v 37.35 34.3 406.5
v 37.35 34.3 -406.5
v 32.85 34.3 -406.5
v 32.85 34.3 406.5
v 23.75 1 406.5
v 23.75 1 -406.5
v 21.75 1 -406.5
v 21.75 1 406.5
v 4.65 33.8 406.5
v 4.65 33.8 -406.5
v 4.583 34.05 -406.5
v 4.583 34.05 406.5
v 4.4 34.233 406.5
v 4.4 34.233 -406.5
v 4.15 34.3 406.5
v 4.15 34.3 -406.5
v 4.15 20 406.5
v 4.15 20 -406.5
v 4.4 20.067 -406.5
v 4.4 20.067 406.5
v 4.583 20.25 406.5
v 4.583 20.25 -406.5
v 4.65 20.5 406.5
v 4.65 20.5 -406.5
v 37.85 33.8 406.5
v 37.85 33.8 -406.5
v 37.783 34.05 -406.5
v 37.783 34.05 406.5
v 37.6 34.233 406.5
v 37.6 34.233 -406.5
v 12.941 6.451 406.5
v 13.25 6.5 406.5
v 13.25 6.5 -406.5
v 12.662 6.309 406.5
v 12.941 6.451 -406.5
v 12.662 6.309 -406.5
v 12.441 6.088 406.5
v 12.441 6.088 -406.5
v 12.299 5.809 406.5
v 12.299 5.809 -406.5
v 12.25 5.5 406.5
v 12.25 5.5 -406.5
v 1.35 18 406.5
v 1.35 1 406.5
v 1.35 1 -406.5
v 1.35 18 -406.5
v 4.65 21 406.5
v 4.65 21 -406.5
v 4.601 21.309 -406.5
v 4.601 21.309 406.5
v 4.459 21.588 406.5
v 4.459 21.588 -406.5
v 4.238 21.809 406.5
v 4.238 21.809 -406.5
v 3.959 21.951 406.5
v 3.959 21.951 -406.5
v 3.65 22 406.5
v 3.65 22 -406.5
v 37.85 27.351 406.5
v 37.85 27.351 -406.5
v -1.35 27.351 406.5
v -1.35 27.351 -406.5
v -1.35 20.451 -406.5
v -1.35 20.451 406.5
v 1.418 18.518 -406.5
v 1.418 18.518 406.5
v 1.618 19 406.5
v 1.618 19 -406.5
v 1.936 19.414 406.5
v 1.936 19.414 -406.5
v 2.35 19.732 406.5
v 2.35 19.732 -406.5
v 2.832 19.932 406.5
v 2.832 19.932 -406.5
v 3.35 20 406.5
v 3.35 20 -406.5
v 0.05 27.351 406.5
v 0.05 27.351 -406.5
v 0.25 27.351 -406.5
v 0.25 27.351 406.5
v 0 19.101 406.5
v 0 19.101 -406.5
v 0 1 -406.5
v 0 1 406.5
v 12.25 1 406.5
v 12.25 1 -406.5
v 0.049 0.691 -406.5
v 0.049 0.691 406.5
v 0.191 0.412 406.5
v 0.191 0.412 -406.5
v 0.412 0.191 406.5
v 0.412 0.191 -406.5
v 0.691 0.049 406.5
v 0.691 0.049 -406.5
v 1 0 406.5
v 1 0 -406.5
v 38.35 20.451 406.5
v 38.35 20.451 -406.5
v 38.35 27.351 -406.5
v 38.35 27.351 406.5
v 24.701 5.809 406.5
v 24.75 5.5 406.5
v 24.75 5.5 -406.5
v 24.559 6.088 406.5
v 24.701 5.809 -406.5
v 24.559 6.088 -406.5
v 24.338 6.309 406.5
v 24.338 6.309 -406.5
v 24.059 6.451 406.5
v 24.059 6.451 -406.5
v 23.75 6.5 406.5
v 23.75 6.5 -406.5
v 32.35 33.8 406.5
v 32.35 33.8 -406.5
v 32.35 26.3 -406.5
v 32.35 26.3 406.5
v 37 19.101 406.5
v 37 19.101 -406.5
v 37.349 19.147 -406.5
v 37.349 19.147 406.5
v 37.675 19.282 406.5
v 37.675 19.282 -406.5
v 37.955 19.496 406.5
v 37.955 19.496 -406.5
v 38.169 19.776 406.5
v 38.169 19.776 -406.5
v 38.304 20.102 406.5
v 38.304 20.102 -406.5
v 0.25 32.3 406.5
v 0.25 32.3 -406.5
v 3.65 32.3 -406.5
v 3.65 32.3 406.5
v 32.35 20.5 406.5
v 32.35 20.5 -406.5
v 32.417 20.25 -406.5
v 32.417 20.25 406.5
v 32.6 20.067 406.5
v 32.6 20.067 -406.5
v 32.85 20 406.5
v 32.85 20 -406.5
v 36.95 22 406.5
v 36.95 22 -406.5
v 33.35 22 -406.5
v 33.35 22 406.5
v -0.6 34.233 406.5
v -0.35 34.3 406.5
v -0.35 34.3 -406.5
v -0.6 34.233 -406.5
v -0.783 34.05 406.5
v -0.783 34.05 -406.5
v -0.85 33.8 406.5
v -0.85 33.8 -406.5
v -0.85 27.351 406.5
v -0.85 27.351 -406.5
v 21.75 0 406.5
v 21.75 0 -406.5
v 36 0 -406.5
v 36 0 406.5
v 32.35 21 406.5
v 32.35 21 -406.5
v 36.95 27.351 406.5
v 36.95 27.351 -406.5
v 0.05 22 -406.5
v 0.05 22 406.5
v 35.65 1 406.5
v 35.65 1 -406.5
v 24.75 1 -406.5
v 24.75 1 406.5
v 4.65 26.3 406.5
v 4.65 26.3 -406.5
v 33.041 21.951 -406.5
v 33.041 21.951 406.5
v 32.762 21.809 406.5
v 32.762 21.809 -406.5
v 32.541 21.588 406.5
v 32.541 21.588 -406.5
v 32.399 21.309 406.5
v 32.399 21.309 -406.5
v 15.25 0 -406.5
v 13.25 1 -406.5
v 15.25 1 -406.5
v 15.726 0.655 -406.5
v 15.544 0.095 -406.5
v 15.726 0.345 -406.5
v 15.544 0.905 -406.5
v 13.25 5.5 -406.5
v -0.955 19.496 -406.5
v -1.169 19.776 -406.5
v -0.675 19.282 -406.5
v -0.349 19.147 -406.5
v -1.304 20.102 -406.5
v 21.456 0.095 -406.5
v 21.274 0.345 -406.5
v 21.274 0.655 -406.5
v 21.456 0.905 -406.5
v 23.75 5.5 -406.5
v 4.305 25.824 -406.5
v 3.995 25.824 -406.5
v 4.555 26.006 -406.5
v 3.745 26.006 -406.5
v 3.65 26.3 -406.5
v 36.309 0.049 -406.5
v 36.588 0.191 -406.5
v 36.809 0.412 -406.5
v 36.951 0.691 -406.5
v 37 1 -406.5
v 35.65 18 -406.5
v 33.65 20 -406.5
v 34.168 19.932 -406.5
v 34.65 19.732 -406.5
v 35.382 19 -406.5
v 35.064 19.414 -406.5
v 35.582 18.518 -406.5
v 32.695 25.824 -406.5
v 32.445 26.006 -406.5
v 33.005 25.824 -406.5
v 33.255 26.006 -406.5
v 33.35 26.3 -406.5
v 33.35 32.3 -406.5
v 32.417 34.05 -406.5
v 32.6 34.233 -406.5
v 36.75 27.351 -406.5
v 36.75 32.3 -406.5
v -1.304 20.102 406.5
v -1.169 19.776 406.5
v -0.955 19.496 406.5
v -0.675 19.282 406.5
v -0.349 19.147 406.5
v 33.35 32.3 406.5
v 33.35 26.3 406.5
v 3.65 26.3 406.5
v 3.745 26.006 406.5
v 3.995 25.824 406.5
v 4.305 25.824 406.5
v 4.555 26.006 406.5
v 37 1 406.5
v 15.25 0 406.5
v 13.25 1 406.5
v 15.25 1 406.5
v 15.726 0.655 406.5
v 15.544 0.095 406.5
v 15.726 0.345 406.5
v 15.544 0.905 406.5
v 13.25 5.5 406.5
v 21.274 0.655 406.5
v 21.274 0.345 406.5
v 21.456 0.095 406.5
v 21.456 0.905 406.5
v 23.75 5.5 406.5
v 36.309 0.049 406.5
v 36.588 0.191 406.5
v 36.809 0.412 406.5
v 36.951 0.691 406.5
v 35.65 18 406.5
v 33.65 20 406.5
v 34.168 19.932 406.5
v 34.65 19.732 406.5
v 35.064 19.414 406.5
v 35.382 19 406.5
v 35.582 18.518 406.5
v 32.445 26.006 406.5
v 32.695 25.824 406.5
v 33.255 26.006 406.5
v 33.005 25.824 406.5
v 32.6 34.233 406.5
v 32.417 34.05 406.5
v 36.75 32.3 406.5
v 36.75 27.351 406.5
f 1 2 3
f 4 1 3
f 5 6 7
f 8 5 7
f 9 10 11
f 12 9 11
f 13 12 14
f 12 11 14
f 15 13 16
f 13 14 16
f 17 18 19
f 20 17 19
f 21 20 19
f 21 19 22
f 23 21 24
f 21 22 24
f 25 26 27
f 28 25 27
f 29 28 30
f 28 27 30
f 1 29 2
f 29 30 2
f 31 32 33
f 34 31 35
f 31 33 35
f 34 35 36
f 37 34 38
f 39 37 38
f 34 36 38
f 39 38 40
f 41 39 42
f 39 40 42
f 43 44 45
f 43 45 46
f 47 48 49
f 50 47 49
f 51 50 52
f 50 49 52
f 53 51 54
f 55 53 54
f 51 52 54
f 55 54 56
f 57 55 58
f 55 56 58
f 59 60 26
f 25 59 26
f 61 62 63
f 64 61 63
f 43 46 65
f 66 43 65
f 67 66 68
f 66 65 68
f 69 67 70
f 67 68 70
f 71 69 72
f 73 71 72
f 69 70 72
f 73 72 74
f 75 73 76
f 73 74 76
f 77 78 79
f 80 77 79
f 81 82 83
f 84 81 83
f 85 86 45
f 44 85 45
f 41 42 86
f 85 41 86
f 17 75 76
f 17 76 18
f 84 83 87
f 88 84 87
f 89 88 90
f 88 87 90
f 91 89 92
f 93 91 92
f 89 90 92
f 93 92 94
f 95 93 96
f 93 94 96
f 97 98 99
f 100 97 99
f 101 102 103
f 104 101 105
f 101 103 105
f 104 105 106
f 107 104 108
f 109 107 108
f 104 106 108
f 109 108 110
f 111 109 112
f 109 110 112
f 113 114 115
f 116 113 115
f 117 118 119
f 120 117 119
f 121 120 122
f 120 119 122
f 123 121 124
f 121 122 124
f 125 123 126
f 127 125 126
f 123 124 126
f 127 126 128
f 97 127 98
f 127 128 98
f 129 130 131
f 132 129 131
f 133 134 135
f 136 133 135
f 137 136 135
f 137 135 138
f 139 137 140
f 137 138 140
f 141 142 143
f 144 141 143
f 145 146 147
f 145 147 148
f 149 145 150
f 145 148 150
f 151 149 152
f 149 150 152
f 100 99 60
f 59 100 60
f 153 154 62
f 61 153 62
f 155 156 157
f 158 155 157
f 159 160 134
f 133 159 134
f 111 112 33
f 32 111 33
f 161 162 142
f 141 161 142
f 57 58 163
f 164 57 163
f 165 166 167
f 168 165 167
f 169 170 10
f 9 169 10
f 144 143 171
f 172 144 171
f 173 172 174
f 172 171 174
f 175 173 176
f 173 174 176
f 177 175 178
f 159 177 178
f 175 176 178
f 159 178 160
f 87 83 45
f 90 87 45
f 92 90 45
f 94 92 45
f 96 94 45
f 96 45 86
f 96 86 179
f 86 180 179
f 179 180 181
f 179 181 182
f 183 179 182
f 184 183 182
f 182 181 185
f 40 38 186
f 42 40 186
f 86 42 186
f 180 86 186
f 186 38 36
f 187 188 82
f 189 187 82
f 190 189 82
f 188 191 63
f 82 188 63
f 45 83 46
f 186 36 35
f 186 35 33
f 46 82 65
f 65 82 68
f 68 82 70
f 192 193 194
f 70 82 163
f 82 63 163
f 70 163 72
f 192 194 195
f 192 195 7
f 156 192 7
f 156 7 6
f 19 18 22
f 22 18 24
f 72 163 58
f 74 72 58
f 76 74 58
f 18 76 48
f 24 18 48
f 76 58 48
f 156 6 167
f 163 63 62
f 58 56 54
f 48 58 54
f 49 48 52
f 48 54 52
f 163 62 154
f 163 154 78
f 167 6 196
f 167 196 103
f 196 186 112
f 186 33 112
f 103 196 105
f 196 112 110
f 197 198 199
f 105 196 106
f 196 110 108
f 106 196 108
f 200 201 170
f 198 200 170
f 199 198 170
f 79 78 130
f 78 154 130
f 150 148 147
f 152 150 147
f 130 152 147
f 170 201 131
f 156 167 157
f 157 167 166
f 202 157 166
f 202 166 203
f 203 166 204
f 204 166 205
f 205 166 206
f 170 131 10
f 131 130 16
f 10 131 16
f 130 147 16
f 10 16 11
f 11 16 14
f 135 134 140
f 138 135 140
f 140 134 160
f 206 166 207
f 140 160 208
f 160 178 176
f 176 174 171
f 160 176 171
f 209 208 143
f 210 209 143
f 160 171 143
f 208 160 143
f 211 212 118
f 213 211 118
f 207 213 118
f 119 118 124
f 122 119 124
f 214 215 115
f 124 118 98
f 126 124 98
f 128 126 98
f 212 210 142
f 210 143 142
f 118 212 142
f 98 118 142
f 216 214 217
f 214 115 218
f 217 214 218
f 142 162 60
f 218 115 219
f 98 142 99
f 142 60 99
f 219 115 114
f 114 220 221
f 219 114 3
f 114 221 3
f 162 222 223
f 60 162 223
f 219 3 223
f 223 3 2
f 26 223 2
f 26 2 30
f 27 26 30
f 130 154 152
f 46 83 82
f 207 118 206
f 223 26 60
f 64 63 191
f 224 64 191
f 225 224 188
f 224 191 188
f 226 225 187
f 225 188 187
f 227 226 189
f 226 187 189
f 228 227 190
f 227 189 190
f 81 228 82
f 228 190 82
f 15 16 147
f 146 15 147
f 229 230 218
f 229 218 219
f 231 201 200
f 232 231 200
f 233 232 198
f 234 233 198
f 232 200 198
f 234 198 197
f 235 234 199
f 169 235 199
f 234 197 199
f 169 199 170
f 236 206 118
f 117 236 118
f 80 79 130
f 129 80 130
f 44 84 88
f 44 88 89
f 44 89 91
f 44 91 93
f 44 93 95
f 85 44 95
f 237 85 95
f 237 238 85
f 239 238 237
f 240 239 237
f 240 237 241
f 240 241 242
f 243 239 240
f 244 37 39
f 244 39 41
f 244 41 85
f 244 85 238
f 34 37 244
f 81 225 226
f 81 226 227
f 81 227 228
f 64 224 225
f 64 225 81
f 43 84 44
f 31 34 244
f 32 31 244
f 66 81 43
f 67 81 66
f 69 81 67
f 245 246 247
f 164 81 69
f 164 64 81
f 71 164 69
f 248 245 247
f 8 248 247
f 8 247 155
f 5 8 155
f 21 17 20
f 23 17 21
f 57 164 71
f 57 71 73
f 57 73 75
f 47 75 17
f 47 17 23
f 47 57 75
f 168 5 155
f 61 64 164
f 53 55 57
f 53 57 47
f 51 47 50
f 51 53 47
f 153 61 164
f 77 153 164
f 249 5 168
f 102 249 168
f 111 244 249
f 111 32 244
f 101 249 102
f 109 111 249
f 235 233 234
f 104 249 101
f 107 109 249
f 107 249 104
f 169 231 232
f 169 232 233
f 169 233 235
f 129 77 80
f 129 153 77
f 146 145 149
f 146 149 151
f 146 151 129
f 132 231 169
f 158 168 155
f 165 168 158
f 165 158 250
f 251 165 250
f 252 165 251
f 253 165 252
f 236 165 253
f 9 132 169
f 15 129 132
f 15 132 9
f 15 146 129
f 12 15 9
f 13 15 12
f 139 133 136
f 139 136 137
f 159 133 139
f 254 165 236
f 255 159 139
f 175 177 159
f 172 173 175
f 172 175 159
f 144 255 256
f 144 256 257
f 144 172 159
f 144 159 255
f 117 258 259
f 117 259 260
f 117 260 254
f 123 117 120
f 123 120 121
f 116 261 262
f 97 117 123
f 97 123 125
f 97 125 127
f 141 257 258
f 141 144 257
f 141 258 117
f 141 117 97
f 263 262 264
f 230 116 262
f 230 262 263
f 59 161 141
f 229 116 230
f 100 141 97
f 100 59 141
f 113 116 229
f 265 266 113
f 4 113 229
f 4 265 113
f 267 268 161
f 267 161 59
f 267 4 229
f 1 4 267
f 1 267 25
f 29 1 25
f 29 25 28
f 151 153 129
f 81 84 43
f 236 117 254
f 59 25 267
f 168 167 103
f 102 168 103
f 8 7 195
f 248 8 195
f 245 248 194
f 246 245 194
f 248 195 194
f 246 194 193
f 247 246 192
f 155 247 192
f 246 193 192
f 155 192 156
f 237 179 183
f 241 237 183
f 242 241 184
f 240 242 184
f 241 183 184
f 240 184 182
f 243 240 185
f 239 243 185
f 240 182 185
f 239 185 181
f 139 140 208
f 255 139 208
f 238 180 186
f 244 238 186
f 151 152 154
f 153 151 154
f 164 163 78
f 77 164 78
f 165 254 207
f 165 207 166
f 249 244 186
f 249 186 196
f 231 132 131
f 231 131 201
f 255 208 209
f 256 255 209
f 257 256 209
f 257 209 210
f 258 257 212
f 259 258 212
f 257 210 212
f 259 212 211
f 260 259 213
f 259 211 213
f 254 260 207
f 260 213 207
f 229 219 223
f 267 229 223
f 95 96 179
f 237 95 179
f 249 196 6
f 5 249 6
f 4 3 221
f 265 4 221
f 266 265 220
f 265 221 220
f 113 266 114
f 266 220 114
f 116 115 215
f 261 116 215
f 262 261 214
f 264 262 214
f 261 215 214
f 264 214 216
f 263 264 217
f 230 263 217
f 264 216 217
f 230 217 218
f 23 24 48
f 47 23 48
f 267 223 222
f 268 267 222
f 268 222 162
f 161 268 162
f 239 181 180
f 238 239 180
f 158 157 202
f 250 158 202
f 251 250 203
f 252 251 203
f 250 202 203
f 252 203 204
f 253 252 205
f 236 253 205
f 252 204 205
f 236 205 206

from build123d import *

# Parameters (mm, degrees)
EXTRUDE_1_DEPTH      = 406.5
EXTRUDE_1_DEPTH_BACK = 406.5


with BuildPart() as part:
    # 草图1 → 凸台-拉伸1 (new, two sides: drawn at the far end of the back side and taken through both)
    with BuildSketch(Plane.XY.offset(-EXTRUDE_1_DEPTH_BACK)):
        with BuildLine():
            Line((24.75, 1), (24.75, 5.5))
            ThreePointArc((24.75, 5.5), (24.457106781, 6.207106781), (23.75, 6.5))
            Line((23.75, 6.5), (18.5, 6.5))
            Line((18.5, 6.5), (13.25, 6.5))
            ThreePointArc((13.25, 6.5), (12.542893219, 6.207106781), (12.25, 5.5))
            Line((12.25, 5.5), (12.25, 1))
            Line((12.25, 1), (1.35, 1))
            Line((1.35, 1), (1.35, 18))
            ThreePointArc((1.35, 18), (1.935786438, 19.414213562), (3.35, 20))
            Line((3.35, 20), (4.15, 20))
            ThreePointArc((4.15, 20), (4.503553391, 20.146446609), (4.65, 20.5))
            Line((4.65, 20.5), (4.65, 21))
            ThreePointArc((4.65, 21), (4.357106781, 21.707106781), (3.65, 22))
            Line((3.65, 22), (0.05, 22))
            Line((0.05, 22), (0.05, 27.351174762))
            Line((0.05, 27.351174762), (0.25, 27.351174762))
            Line((0.25, 27.351174762), (0.25, 32.3))
            Line((0.25, 32.3), (3.65, 32.3))
            Line((3.65, 32.3), (3.65, 26.3))
            ThreePointArc((3.65, 26.3), (4.15, 25.8), (4.65, 26.3))
            Line((4.65, 26.3), (4.65, 33.8))
            ThreePointArc((4.65, 33.8), (4.503553391, 34.153553391), (4.15, 34.3))
            Line((4.15, 34.3), (-0.35, 34.3))
            ThreePointArc((-0.35, 34.3), (-0.703553391, 34.153553391), (-0.85, 33.8))
            Line((-0.85, 33.8), (-0.85, 27.351174762))
            Line((-0.85, 27.351174762), (-1.35, 27.351174762))
            Line((-1.35, 27.351174762), (-1.35, 20.450932326))
            ThreePointArc((-1.35, 20.450932326), (-0.954594155, 19.496338171), (0, 19.100932326))
            Line((0, 19.100932326), (0, 1))
            ThreePointArc((0, 1), (0.292893219, 0.292893219), (1, 0))
            Line((1, 0), (15.25, 0))
            ThreePointArc((15.25, 0), (15.75, 0.5), (15.25, 1))
            Line((15.25, 1), (13.25, 1))
            Line((13.25, 1), (13.25, 5.5))
            Line((13.25, 5.5), (18.5, 5.5))
            Line((18.5, 5.5), (23.75, 5.5))
            Line((23.75, 5.5), (23.75, 1))
            Line((23.75, 1), (21.75, 1))
            ThreePointArc((21.75, 1), (21.25, 0.5), (21.75, 0))
            Line((21.75, 0), (36, 0))
            ThreePointArc((36, 0), (36.707106781, 0.292893219), (37, 1))
            Line((37, 1), (37, 19.100932326))
            ThreePointArc((37, 19.100932326), (37.954594155, 19.496338171), (38.35, 20.450932326))
            Line((38.35, 20.450932326), (38.35, 27.351174762))
            Line((38.35, 27.351174762), (37.85, 27.351174762))
            Line((37.85, 27.351174762), (37.85, 33.8))
            ThreePointArc((37.85, 33.8), (37.703553391, 34.153553391), (37.35, 34.3))
            Line((37.35, 34.3), (32.85, 34.3))
            ThreePointArc((32.85, 34.3), (32.496446609, 34.153553391), (32.35, 33.8))
            Line((32.35, 33.8), (32.35, 26.3))
            ThreePointArc((32.35, 26.3), (32.85, 25.8), (33.35, 26.3))
            Line((33.35, 26.3), (33.35, 32.3))
            Line((33.35, 32.3), (36.75, 32.3))
            Line((36.75, 32.3), (36.75, 27.351174762))
            Line((36.75, 27.351174762), (36.95, 27.351174762))
            Line((36.95, 27.351174762), (36.95, 22))
            Line((36.95, 22), (33.35, 22))
            ThreePointArc((33.35, 22), (32.642893219, 21.707106781), (32.35, 21))
            Line((32.35, 21), (32.35, 20.5))
            ThreePointArc((32.35, 20.5), (32.496446609, 20.146446609), (32.85, 20))
            Line((32.85, 20), (33.65, 20))
            ThreePointArc((33.65, 20), (35.064213562, 19.414213562), (35.65, 18))
            Line((35.65, 18), (35.65, 1))
            Line((35.65, 1), (24.75, 1))
        make_face()
    extrude(amount=EXTRUDE_1_DEPTH + EXTRUDE_1_DEPTH_BACK)


solid = part.part
